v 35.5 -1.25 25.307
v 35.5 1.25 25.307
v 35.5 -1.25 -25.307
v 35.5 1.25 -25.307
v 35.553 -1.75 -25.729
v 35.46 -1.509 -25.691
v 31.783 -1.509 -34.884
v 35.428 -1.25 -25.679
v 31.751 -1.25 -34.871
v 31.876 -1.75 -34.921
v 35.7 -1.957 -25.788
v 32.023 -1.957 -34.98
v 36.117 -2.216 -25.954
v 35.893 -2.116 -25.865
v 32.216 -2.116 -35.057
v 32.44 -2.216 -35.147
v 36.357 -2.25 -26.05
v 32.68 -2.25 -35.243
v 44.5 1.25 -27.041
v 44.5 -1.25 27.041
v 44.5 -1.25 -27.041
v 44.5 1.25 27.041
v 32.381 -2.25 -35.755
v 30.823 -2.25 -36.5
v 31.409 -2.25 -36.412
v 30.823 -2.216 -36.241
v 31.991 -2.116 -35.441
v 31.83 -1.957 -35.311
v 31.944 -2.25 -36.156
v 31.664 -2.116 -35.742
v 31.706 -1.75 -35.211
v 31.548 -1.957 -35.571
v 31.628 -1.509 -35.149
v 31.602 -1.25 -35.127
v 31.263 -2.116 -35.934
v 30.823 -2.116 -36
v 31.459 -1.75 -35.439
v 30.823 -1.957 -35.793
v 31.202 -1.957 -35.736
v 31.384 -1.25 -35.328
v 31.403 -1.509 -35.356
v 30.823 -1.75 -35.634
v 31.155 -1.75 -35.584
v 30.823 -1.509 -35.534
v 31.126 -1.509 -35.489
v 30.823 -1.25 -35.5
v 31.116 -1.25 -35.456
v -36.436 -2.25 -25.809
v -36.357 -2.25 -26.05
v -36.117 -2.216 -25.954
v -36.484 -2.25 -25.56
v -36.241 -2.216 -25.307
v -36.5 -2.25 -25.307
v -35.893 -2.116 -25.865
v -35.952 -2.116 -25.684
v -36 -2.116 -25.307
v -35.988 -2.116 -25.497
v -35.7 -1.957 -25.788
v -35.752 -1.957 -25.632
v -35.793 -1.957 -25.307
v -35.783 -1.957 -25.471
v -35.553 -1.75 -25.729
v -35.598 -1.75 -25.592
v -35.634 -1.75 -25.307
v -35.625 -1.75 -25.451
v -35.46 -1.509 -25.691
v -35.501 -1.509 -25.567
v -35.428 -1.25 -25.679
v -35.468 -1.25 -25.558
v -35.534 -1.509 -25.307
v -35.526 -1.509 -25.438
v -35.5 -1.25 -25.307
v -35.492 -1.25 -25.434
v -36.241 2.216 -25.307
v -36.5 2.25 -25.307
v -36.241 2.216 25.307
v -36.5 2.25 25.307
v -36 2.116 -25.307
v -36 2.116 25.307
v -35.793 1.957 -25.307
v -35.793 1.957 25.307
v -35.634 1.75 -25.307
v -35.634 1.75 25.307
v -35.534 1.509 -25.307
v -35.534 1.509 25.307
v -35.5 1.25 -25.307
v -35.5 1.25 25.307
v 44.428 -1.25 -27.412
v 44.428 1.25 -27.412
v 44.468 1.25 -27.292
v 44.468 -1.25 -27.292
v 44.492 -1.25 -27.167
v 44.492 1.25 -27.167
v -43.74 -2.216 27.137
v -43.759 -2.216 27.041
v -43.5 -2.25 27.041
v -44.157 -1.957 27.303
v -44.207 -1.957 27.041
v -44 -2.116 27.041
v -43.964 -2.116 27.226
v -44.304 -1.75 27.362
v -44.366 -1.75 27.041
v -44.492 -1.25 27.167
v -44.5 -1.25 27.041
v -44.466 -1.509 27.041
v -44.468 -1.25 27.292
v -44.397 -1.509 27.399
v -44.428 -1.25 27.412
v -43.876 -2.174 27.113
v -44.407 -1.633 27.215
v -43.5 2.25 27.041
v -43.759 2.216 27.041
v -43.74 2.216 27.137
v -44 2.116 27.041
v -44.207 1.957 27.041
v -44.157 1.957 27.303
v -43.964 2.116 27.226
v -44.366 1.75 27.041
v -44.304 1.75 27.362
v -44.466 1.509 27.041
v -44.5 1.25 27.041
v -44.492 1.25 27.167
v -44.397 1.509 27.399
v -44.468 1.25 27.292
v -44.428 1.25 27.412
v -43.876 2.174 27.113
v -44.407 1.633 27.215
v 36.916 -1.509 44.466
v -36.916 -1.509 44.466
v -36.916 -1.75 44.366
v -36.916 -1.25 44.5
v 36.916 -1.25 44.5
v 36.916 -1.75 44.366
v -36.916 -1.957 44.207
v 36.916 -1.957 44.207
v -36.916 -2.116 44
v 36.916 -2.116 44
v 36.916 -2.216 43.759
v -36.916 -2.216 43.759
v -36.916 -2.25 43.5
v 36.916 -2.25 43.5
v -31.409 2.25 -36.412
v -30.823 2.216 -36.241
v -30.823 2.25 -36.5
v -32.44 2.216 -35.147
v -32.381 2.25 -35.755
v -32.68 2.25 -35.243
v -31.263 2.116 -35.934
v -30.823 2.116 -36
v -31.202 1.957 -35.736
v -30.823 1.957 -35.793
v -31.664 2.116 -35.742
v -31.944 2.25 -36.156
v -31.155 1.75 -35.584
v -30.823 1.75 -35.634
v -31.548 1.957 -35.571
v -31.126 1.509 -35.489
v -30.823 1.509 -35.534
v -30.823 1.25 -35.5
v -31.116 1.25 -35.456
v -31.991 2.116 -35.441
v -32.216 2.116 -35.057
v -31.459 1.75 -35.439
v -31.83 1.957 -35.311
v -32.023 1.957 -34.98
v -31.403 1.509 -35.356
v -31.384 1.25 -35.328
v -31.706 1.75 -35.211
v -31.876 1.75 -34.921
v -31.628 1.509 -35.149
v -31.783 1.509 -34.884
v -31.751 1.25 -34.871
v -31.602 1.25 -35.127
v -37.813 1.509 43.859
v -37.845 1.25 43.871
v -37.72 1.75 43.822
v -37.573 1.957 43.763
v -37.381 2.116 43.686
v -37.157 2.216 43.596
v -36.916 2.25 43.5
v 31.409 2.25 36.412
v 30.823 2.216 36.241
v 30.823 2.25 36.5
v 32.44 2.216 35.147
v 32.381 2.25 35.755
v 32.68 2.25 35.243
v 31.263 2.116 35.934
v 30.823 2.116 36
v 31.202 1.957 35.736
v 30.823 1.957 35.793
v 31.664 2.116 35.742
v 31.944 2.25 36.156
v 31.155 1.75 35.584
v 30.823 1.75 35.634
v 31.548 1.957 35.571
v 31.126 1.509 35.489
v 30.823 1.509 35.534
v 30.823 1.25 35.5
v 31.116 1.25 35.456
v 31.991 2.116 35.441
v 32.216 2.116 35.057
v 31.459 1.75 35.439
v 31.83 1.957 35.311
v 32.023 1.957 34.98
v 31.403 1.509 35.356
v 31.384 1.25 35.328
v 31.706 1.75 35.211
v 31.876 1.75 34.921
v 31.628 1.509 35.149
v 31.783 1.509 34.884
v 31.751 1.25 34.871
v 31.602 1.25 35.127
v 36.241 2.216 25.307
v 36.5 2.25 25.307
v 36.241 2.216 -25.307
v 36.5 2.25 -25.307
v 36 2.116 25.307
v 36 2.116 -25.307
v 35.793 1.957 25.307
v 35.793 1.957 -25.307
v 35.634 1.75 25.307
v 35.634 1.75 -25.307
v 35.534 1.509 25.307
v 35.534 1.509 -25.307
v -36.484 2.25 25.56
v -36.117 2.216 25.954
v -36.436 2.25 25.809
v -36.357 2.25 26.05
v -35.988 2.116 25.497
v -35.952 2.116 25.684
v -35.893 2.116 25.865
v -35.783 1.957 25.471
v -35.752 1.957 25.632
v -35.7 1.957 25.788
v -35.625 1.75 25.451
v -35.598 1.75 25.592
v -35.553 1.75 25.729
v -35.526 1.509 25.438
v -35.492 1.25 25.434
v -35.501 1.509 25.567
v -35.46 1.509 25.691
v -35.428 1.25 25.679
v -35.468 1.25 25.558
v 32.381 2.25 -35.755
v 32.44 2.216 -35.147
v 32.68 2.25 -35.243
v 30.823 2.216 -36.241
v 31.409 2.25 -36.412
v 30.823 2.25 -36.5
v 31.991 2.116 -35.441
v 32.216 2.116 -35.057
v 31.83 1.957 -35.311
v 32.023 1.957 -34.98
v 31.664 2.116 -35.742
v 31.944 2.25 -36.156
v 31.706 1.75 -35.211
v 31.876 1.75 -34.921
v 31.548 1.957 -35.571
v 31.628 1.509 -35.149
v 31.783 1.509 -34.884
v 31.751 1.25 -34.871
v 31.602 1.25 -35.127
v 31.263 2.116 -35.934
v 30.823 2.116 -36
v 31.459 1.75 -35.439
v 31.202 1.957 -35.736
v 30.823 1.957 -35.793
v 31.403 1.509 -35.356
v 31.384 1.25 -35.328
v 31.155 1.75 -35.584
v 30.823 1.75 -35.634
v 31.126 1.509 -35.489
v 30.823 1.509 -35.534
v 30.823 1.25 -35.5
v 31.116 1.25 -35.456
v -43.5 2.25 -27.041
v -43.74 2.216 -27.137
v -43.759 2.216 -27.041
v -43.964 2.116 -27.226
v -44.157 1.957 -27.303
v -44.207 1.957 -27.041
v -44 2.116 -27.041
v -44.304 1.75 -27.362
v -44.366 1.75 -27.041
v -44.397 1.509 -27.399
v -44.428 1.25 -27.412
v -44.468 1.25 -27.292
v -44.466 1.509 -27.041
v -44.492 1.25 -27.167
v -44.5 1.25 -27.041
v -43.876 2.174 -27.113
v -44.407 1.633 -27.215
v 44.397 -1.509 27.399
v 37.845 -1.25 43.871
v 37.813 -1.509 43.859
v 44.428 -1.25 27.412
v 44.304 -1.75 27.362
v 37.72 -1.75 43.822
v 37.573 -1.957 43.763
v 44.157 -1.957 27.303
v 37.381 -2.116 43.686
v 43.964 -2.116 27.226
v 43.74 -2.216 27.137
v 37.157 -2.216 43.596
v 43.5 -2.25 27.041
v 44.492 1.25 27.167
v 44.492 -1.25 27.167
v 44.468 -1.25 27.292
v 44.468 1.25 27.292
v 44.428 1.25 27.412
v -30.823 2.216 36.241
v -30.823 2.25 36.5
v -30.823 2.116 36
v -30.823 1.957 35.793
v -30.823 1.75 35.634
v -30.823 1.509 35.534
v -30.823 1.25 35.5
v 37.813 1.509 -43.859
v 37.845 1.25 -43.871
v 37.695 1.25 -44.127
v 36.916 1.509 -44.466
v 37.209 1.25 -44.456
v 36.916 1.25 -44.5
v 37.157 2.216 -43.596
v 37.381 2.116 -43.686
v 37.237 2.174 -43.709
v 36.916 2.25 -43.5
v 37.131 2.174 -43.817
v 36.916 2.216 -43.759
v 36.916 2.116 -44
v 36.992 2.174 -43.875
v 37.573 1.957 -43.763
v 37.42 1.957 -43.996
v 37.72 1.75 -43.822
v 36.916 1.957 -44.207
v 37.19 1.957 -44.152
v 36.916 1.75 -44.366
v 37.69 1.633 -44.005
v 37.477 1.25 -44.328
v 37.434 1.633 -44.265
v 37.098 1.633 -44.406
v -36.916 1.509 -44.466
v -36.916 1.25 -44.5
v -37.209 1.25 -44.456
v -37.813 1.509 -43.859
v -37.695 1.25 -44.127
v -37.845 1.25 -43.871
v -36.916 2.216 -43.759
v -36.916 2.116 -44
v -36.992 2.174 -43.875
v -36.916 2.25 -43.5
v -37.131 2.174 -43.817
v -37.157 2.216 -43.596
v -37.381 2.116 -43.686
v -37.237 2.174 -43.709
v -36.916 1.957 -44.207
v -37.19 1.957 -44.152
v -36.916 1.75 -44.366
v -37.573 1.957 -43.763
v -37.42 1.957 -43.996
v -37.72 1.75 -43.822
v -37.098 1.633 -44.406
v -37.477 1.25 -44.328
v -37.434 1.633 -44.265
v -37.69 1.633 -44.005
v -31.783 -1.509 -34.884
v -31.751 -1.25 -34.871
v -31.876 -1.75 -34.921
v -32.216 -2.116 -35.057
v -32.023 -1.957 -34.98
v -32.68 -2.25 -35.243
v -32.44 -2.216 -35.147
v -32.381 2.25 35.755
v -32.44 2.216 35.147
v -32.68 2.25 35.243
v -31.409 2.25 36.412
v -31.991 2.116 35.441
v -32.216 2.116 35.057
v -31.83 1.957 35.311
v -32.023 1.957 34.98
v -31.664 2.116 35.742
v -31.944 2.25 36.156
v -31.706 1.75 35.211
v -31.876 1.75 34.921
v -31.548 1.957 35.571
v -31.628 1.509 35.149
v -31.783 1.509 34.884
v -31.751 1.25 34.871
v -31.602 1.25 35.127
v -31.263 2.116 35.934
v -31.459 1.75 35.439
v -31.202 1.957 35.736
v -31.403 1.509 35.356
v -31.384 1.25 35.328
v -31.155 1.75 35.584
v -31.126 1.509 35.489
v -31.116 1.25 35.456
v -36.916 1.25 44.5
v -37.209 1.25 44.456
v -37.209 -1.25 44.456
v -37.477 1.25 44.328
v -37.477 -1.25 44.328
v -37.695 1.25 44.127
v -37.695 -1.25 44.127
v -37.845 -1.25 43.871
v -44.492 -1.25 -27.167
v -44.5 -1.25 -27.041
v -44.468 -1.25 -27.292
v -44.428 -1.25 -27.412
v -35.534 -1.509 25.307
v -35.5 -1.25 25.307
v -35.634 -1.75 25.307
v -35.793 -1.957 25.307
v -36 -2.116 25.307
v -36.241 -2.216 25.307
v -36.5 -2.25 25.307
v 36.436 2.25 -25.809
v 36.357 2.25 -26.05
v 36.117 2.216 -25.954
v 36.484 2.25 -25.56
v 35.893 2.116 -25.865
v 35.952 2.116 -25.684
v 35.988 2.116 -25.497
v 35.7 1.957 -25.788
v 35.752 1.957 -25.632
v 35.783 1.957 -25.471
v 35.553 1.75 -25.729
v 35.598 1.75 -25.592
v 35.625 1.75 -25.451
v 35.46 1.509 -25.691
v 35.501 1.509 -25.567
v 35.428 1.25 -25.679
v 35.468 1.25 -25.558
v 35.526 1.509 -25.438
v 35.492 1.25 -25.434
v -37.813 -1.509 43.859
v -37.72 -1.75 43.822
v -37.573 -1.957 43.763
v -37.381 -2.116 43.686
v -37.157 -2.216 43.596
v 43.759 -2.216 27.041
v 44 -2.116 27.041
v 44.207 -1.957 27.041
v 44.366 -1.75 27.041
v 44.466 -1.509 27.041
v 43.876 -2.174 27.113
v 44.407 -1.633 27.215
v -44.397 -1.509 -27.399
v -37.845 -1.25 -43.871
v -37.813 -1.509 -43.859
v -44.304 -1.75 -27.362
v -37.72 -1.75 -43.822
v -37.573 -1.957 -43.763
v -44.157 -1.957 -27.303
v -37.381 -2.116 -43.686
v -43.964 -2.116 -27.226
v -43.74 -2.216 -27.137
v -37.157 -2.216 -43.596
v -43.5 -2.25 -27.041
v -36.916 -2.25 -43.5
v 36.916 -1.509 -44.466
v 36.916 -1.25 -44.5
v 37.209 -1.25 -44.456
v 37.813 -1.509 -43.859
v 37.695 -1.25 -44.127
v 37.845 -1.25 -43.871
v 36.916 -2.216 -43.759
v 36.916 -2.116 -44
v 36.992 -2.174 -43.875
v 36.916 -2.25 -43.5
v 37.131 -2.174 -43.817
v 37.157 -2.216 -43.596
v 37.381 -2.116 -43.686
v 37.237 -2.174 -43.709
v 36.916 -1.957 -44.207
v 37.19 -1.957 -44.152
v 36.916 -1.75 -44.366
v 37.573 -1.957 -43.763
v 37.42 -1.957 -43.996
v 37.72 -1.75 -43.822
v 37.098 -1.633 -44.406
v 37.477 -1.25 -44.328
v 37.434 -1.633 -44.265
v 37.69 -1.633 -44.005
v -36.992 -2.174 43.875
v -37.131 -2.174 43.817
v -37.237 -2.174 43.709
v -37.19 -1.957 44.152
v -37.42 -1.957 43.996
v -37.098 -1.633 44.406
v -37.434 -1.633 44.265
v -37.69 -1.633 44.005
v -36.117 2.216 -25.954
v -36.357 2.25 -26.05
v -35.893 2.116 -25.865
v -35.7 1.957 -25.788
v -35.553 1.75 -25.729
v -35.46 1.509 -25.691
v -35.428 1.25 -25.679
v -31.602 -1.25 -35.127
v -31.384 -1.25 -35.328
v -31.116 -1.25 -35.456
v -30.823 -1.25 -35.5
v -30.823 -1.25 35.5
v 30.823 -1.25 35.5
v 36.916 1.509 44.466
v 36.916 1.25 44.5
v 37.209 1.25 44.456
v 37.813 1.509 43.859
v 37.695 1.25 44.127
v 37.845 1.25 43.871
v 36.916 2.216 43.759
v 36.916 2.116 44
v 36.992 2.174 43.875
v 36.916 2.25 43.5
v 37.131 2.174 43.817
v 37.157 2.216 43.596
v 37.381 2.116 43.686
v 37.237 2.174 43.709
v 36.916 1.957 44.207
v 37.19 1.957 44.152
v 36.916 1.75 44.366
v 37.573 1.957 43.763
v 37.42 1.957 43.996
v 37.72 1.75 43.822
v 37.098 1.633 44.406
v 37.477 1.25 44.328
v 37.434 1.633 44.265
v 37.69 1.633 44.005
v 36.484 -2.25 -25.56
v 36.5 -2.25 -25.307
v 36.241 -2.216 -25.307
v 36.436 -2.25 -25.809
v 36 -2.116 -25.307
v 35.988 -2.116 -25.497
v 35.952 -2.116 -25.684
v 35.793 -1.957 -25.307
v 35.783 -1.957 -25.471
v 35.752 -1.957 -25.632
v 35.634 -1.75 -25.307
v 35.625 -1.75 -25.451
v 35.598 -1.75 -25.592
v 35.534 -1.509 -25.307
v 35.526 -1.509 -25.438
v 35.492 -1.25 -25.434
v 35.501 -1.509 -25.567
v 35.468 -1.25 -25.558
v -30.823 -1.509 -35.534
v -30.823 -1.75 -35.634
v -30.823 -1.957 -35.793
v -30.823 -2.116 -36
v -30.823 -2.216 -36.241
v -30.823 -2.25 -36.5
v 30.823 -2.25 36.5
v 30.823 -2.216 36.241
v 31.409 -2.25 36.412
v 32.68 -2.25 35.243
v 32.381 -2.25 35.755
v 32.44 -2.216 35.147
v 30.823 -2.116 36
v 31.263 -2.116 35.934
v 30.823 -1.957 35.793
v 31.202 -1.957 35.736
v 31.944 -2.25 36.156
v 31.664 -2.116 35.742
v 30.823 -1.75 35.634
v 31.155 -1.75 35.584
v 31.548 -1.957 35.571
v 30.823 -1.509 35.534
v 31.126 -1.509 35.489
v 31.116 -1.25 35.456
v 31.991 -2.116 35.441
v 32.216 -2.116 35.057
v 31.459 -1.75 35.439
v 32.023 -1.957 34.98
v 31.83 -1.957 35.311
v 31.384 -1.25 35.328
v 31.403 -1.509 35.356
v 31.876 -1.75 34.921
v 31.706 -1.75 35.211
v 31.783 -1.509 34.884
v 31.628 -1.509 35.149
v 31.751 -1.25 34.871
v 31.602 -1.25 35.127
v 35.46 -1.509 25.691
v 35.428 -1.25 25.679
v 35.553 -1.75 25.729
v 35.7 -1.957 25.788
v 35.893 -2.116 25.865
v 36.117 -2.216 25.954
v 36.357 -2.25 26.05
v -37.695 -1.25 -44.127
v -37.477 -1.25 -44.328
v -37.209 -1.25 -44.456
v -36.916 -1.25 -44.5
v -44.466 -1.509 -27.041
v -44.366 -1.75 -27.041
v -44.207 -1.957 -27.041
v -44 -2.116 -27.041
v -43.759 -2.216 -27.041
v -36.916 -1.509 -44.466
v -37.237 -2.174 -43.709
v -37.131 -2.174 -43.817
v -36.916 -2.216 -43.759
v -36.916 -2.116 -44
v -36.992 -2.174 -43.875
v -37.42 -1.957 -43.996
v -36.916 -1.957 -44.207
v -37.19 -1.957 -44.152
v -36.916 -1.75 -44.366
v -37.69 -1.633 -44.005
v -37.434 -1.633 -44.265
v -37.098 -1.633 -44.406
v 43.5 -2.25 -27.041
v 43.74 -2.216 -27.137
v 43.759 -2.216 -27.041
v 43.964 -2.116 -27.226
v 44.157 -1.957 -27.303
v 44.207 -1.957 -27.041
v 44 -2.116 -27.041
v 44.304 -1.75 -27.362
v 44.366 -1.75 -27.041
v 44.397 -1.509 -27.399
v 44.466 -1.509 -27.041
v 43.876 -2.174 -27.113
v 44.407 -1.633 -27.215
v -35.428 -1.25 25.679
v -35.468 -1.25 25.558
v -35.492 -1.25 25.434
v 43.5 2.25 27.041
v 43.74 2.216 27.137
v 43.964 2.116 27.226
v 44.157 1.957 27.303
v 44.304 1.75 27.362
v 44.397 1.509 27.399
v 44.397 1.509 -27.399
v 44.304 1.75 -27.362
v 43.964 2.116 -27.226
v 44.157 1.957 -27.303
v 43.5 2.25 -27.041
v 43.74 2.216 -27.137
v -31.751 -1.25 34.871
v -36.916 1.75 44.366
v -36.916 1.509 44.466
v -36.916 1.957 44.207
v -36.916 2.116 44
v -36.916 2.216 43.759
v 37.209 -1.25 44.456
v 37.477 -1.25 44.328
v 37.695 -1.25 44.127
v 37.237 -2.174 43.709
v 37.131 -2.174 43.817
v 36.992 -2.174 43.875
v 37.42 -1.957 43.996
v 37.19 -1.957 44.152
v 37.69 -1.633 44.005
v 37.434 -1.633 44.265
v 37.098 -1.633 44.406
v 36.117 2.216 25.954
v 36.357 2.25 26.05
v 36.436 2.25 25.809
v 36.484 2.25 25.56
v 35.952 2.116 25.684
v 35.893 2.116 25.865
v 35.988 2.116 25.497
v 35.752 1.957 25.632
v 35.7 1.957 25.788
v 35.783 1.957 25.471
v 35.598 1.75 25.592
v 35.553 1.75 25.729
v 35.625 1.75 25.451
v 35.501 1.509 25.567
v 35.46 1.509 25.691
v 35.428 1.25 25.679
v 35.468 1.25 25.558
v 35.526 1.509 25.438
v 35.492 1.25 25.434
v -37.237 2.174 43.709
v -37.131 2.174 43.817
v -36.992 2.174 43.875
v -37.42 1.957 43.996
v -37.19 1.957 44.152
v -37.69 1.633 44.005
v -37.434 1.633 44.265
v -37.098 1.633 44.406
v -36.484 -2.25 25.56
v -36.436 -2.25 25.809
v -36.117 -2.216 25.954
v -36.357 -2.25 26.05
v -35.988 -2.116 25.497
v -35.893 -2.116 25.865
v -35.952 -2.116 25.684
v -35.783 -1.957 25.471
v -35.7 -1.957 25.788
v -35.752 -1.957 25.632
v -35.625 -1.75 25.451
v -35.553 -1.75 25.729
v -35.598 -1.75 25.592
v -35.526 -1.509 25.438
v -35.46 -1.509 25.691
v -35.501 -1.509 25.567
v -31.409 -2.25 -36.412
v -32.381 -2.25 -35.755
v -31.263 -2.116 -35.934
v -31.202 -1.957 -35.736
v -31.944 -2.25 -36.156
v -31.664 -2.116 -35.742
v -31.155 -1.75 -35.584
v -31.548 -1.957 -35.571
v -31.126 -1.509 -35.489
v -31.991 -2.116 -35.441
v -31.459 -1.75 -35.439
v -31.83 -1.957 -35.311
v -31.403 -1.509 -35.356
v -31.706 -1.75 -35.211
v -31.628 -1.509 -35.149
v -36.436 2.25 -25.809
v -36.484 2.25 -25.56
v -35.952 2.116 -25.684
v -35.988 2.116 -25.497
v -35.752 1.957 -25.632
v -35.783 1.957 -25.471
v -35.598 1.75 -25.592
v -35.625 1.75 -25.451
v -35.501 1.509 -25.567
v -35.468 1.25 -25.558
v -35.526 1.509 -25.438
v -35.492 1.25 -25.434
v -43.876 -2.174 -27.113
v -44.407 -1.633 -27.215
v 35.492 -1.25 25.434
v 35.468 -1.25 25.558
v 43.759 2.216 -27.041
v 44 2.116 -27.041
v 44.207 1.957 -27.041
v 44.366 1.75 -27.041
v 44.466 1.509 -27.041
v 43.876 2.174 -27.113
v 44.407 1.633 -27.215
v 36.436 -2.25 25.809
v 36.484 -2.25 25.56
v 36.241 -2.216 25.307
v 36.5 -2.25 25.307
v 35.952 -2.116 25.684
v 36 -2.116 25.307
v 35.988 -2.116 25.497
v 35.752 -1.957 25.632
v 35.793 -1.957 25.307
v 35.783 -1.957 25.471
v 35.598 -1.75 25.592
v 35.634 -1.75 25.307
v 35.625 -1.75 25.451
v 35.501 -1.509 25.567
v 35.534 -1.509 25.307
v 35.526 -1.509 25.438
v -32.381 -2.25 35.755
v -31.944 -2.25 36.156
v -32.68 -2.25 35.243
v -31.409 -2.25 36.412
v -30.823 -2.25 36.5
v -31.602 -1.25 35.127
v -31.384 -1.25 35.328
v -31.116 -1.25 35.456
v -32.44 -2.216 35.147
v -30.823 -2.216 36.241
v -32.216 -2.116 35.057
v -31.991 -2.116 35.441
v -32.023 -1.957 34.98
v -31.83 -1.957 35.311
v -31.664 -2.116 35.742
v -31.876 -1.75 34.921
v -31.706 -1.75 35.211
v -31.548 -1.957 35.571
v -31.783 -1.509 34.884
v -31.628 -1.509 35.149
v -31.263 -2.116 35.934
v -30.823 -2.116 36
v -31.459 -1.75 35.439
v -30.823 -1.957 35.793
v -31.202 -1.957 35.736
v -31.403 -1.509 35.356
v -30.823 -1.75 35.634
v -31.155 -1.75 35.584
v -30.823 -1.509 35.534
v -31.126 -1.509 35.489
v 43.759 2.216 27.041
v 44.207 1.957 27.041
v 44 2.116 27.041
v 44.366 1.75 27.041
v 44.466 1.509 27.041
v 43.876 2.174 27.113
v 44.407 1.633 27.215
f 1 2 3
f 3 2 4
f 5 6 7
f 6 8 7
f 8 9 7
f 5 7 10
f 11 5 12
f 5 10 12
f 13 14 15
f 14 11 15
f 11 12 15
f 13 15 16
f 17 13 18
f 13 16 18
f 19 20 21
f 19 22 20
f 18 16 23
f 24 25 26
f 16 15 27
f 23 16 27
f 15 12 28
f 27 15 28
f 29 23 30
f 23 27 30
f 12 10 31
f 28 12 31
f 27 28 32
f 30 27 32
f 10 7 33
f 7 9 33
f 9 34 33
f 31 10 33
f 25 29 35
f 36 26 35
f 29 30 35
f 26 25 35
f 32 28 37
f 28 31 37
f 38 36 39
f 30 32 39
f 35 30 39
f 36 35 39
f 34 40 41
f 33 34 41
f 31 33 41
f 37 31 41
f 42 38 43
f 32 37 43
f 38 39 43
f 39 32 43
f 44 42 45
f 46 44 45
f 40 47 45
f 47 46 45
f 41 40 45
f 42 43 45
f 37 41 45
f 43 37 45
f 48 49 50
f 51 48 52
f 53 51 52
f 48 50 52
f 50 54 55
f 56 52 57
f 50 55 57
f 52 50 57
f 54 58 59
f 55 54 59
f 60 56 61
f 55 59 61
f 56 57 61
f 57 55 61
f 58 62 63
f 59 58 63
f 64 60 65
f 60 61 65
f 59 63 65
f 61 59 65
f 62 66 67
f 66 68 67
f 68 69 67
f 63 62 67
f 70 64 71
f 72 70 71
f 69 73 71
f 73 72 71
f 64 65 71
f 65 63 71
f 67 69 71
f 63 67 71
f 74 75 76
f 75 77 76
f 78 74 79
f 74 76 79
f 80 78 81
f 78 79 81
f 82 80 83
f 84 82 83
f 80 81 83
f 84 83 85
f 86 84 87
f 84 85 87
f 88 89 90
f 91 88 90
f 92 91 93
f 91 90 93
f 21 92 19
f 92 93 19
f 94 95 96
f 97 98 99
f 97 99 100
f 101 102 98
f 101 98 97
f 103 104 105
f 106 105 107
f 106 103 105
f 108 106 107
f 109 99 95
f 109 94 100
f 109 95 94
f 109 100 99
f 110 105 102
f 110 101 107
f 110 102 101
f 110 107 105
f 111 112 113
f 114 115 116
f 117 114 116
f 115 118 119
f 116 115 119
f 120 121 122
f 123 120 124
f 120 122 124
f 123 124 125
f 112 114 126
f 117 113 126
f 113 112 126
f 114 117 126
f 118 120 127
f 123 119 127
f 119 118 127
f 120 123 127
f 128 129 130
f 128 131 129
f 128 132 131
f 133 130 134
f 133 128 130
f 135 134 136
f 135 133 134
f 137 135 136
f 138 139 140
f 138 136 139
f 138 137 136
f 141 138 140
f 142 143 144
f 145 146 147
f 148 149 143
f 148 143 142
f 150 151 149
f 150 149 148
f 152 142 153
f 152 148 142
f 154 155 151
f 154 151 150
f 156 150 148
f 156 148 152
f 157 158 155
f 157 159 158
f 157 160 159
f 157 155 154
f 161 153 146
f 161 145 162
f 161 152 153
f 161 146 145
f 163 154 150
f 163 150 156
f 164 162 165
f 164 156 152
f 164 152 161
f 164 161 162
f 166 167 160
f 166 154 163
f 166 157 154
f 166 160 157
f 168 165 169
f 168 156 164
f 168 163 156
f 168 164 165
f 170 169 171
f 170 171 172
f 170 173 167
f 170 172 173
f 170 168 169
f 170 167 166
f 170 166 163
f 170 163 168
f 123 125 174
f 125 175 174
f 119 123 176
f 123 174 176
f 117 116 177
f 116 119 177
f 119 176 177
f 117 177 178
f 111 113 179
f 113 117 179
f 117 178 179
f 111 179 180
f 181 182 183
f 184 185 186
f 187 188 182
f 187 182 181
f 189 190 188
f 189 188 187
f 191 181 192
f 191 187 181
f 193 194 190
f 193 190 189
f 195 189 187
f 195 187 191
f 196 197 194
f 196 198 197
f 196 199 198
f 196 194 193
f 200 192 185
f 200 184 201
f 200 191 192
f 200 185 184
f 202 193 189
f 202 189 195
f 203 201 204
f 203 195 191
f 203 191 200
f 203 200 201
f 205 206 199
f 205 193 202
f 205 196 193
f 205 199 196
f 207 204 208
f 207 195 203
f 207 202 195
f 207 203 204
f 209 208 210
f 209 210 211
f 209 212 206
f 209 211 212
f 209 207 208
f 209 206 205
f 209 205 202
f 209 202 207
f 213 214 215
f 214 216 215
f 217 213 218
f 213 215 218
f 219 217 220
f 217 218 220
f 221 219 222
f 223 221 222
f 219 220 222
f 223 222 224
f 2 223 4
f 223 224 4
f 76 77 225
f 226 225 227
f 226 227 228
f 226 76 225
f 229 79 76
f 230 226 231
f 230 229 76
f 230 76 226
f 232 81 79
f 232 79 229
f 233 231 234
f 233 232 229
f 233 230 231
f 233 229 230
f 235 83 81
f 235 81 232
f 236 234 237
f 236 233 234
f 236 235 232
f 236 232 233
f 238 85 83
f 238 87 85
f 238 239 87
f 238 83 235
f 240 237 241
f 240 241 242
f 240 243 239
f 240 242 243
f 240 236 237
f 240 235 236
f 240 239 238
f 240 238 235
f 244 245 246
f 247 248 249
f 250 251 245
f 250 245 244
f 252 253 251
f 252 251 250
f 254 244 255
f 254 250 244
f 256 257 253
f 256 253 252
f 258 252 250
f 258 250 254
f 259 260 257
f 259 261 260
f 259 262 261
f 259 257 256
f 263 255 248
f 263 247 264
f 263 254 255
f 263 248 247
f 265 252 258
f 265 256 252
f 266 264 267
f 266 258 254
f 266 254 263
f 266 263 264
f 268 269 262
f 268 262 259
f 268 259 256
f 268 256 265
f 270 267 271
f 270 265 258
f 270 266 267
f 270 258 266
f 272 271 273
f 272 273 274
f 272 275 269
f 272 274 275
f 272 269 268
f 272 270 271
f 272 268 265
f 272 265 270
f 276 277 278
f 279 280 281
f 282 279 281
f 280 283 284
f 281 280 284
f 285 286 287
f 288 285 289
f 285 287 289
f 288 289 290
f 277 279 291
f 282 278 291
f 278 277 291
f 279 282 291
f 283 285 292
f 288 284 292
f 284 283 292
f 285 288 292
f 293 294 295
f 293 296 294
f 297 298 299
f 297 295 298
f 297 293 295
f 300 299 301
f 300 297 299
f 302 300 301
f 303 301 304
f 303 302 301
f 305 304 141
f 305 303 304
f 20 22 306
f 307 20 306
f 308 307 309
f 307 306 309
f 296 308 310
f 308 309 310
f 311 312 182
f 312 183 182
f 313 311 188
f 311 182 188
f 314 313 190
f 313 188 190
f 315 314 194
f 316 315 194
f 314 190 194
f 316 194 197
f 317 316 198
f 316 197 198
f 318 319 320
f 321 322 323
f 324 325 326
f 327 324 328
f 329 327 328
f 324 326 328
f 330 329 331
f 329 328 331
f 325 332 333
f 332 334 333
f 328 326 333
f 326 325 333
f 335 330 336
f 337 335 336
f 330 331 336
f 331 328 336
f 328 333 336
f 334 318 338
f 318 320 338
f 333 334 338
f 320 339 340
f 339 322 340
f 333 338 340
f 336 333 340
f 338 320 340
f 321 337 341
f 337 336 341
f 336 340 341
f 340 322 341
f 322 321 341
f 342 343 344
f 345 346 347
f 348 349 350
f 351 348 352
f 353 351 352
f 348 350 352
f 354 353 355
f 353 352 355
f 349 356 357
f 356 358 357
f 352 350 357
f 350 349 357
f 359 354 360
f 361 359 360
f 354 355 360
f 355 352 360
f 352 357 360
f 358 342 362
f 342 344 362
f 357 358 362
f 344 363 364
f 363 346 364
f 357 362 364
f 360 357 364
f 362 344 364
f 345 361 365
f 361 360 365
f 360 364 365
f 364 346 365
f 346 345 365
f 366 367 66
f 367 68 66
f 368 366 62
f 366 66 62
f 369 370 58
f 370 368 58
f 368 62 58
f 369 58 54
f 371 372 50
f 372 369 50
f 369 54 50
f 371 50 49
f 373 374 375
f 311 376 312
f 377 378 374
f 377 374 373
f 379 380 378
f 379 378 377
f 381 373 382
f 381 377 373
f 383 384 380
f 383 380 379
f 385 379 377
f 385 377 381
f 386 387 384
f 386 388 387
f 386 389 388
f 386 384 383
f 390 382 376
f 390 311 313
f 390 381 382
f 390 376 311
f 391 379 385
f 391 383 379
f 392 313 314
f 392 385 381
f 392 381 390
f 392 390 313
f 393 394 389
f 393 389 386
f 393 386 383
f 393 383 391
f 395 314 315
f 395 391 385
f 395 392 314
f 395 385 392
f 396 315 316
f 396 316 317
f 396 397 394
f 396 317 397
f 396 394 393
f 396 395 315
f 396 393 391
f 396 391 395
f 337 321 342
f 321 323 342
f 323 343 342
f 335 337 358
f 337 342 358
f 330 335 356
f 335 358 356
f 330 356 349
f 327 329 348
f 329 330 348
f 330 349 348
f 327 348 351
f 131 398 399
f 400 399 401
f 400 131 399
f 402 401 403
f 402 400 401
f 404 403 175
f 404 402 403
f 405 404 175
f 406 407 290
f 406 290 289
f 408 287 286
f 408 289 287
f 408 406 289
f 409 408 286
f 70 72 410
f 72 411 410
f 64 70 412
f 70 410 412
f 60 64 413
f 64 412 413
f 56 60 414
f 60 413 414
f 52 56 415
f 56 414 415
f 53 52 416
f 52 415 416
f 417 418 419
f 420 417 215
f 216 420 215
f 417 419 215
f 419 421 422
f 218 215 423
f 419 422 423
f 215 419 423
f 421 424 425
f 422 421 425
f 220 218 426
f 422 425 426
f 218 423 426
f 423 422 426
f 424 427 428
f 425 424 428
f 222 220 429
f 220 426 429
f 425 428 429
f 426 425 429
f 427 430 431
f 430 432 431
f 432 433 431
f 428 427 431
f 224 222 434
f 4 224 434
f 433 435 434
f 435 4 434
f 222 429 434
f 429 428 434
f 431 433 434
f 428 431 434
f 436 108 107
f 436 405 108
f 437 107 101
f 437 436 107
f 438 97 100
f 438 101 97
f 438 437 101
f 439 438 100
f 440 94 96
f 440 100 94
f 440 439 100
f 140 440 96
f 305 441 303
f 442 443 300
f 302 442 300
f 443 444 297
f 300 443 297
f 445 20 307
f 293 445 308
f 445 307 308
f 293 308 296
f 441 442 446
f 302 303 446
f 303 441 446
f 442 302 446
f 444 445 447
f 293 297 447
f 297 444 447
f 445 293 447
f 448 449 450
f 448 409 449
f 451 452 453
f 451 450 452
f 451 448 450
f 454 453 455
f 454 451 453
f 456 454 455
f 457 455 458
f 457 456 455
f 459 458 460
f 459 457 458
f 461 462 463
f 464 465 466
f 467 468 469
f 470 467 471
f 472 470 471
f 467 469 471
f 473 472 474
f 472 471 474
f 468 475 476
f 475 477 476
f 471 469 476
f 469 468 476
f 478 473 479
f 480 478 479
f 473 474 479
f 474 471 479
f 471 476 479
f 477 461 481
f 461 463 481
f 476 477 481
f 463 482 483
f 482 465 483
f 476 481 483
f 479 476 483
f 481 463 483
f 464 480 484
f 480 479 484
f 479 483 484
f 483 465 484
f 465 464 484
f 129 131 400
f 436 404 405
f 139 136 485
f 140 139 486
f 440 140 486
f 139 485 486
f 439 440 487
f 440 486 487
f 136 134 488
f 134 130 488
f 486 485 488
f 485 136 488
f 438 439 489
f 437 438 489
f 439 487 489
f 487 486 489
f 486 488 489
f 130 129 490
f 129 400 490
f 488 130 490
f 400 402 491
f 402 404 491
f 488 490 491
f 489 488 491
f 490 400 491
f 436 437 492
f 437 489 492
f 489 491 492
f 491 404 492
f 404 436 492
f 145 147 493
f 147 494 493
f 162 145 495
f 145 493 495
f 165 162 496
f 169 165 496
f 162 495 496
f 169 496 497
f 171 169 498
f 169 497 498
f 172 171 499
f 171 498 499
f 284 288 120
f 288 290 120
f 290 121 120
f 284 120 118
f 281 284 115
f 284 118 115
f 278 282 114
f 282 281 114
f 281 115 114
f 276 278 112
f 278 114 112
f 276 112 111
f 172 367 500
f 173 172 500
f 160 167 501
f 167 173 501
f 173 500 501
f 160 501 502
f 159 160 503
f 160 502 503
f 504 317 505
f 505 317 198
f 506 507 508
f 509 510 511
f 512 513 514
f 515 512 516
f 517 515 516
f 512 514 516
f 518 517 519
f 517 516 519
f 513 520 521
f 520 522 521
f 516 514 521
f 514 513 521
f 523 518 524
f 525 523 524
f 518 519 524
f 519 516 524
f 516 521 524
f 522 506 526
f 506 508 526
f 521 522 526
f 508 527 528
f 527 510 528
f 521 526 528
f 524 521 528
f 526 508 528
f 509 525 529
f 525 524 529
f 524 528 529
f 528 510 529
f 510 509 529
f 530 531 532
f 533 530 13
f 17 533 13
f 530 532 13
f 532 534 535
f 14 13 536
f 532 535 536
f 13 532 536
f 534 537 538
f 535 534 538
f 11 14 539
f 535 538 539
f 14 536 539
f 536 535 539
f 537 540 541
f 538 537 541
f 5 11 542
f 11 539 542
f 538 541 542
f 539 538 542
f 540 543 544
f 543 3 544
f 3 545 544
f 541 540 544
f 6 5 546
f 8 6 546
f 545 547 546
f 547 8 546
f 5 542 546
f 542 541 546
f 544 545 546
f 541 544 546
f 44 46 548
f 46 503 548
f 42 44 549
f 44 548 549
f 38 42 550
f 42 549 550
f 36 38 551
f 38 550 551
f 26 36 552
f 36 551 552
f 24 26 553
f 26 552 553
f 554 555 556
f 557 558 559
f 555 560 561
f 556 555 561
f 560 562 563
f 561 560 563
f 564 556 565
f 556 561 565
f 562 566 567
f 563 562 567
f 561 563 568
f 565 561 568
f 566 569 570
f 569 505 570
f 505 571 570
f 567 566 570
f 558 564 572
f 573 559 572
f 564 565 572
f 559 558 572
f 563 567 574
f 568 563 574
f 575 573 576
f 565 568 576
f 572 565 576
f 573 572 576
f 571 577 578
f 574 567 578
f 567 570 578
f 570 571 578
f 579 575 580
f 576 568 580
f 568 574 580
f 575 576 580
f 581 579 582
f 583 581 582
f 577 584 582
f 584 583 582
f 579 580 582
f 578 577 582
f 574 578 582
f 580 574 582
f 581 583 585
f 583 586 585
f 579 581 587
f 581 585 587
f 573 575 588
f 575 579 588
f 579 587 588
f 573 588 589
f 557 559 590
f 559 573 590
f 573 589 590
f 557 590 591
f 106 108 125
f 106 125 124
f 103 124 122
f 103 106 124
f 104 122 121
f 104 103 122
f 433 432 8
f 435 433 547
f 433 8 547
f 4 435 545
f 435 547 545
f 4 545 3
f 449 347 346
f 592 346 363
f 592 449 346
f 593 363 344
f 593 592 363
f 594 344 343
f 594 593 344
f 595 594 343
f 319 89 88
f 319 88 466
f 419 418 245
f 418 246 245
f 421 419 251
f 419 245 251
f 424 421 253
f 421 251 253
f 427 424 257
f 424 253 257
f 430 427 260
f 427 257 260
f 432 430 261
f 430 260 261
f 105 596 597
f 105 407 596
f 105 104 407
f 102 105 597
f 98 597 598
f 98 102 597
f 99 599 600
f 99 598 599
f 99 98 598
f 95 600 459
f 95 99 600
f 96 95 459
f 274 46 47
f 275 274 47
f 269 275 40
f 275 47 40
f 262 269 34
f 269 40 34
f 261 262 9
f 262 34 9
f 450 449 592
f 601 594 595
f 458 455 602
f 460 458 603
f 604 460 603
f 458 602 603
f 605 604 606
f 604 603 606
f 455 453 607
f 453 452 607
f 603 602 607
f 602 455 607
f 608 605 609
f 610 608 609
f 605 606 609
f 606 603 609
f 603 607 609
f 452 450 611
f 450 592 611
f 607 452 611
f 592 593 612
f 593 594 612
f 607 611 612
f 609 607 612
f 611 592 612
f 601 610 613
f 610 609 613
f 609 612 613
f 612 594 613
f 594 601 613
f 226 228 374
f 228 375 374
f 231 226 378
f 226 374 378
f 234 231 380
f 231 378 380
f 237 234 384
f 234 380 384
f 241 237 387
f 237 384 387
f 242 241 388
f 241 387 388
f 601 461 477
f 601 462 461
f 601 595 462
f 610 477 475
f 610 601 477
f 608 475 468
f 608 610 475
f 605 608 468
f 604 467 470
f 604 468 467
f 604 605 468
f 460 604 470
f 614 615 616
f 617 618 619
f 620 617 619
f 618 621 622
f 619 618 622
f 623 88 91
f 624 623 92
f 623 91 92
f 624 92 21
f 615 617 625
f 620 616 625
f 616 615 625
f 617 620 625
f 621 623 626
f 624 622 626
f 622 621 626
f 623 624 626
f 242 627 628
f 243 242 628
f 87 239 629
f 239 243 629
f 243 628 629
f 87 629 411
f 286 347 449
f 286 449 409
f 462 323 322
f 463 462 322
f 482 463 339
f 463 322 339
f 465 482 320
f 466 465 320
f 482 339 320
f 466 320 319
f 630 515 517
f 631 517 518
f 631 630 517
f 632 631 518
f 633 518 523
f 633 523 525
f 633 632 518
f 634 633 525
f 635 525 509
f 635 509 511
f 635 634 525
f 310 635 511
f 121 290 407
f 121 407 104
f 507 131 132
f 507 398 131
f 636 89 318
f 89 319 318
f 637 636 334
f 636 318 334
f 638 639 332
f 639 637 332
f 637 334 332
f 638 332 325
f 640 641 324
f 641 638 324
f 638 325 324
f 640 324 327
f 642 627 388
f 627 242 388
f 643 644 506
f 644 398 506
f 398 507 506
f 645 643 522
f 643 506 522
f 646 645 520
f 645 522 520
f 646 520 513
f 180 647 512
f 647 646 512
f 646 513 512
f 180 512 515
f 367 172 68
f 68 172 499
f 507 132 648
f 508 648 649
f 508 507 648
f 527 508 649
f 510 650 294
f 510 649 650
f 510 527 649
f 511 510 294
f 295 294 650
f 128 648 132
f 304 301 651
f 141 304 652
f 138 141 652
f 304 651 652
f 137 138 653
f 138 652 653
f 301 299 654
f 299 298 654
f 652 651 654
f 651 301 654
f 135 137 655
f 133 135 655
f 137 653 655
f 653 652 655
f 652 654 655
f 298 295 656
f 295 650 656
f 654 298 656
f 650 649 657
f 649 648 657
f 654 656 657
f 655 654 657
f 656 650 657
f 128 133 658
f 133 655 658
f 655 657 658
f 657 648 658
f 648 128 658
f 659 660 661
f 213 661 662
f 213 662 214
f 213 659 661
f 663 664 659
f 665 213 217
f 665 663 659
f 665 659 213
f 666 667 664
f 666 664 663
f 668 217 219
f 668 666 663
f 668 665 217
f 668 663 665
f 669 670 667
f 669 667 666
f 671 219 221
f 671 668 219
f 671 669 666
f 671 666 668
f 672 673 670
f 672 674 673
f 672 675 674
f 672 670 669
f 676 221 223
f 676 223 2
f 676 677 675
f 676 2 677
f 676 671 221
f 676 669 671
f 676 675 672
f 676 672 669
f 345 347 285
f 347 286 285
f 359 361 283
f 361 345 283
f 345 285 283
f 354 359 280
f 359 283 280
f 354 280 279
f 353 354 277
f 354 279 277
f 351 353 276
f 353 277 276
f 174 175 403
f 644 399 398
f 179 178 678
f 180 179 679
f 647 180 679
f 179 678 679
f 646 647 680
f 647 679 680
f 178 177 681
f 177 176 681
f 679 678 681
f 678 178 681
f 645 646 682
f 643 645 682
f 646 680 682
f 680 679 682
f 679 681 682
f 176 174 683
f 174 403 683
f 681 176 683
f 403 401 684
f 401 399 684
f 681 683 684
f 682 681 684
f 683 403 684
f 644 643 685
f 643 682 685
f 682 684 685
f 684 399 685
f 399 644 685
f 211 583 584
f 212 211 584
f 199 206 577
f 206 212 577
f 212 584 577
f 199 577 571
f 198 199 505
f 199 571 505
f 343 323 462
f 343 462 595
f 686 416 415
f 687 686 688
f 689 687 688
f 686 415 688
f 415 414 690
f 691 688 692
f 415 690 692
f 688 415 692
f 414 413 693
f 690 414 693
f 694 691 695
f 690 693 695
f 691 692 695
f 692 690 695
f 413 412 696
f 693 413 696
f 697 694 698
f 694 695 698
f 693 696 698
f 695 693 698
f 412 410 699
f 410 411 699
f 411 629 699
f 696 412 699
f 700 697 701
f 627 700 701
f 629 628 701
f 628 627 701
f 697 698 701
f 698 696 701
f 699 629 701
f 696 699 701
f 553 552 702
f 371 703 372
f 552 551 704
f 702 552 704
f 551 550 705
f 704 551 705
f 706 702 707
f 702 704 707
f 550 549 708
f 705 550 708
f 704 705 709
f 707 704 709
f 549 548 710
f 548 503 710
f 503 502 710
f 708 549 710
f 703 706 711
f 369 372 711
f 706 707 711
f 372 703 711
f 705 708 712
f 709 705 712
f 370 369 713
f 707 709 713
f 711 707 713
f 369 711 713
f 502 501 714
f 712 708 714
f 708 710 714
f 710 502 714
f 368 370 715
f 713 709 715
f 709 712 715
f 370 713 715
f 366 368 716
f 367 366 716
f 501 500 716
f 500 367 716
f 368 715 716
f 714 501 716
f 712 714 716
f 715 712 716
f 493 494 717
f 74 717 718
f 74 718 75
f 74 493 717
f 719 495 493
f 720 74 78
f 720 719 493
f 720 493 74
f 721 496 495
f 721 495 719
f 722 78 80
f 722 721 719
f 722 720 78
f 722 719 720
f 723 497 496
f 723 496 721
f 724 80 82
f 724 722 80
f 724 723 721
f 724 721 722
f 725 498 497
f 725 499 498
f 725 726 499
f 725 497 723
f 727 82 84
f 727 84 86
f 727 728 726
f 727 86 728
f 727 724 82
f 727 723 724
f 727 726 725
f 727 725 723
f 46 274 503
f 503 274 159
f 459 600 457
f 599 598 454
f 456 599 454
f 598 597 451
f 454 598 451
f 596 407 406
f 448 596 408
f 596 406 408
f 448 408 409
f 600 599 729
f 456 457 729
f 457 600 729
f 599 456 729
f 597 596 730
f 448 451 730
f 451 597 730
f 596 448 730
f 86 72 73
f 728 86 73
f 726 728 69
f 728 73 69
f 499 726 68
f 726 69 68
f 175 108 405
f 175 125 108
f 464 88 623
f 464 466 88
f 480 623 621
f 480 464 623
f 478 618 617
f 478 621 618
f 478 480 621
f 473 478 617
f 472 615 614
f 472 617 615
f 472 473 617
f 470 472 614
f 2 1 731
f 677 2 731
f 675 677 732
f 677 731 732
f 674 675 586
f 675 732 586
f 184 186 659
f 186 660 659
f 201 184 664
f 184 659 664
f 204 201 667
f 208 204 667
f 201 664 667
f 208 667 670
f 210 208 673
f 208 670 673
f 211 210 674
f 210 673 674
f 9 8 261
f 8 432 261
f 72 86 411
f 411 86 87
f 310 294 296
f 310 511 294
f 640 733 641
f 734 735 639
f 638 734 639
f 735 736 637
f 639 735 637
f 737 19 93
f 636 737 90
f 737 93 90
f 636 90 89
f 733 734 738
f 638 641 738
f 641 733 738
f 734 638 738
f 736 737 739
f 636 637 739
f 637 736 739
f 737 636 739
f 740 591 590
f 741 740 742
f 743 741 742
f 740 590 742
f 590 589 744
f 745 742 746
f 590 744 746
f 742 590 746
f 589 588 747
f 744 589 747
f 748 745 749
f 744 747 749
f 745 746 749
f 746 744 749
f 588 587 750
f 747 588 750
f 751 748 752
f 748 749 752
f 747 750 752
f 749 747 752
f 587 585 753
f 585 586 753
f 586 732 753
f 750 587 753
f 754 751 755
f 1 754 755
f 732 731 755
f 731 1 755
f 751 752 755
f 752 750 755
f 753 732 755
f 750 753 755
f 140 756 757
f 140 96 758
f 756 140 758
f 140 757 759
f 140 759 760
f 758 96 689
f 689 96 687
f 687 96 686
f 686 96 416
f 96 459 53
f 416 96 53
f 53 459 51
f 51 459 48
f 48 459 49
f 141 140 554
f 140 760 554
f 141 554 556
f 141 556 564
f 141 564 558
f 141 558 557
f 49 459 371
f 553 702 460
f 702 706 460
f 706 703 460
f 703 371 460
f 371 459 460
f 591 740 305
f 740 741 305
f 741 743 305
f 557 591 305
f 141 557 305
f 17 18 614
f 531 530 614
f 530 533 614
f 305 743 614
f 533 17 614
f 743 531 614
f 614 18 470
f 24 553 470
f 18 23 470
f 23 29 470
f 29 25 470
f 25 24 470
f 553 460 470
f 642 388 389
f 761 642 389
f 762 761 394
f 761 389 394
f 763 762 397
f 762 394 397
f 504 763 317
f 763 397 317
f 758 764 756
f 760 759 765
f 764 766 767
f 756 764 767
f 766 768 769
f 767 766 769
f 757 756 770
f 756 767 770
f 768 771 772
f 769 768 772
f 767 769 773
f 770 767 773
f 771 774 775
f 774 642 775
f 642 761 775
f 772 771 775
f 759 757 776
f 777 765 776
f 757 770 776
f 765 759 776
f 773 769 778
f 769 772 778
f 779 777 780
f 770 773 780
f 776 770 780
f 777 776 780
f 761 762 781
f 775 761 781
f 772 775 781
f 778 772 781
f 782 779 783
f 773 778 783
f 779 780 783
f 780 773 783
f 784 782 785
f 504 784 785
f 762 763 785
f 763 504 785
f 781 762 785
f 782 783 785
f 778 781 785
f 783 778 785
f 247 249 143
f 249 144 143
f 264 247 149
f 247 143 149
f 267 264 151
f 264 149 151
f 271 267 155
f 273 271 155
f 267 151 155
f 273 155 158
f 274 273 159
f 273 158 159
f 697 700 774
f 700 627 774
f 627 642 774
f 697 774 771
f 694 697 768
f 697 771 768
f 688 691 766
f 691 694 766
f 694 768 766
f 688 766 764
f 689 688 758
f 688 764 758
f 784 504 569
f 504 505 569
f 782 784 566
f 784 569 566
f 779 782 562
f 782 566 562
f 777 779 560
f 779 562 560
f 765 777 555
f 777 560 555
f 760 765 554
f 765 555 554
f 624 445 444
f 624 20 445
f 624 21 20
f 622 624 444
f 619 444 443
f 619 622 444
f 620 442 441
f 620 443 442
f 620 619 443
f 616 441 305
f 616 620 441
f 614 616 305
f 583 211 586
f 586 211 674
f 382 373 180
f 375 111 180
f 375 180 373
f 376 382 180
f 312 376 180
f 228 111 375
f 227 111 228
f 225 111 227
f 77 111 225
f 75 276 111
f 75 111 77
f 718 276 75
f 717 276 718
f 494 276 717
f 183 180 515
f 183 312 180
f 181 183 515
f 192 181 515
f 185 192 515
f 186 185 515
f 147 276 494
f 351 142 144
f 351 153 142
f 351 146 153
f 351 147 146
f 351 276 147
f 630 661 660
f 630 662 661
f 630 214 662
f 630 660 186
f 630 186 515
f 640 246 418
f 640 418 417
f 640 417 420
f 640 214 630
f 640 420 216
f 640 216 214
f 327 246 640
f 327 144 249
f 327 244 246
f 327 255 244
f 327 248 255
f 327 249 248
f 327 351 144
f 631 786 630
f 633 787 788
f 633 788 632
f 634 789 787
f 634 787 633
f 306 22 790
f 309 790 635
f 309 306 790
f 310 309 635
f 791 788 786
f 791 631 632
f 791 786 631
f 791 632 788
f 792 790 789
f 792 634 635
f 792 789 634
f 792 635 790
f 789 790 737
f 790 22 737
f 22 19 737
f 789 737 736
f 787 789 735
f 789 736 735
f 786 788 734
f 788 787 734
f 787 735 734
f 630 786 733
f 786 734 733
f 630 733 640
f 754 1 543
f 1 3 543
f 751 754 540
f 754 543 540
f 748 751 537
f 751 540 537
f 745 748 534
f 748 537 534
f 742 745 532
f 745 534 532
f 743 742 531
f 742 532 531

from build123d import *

# Parameters (mm, degrees)
BOSS_EXTRUDE1_DEPTH = 2.25
FILLET1_R           = 1


with BuildPart() as part:
    # Sketch1 → Boss-Extrude1 (new body, symmetric)
    with BuildSketch(Plane(origin=(0, 0, 0), x_dir=(1, 0, 0), z_dir=(0, 1, 0))):
        Polygon((-37.593296653, -44.5), (37.593296653, -44.5), (44.5, -27.233241632), (44.5, 27.233241632), (37.593296653, 44.5), (-37.593296653, 44.5), (-44.5, 27.233241632), (-44.5, -27.233241632), align=None)
        Polygon((-31.5, -35.5), (31.5, -35.5), (35.5, -25.5), (35.5, 25.5), (31.5, 35.5), (-31.5, 35.5), (-35.5, 25.5), (-35.5, -25.5), align=None, mode=Mode.SUBTRACT)
    extrude(amount=BOSS_EXTRUDE1_DEPTH, both=True)

    # Fillet1
    fillet1_edges = [part.edges().sort_by_distance(p)[0] for p in [
        (44.5, -2.25, 0),
        (41.046648326, -2.25, 35.866620816),
        (0, -2.25, 44.5),
        (-41.046648326, -2.25, 35.866620816),
        (41.046648326, 2.25, 35.866620816),
        (-44.5, 0, 27.233241632),
        (-44.5, 0, -27.233241632),
        (-37.593296653, 0, -44.5),
        (37.593296653, 0, -44.5),
        (44.5, 0, -27.233241632),
        (44.5, 0, 27.233241632),
        (37.593296653, 0, 44.5),
        (-37.593296653, 0, 44.5),
        (44.5, 2.25, 0),
        (41.046648326, 2.25, -35.866620816),
        (0, 2.25, -44.5),
        (33.5, -2.25, -30.5),
        (35.5, 0, -25.5),
        (0, -2.25, -35.5),
        (31.5, 0, -35.5),
        (-33.5, -2.25, -30.5),
        (-31.5, 0, -35.5),
        (-35.5, -2.25, 0),
        (-41.046648326, 2.25, -35.866620816),
        (-35.5, 0, -25.5),
        (-33.5, -2.25, 30.5),
        (-35.5, 0, 25.5),
        (0, -2.25, 35.5),
        (-31.5, 0, 35.5),
        (33.5, -2.25, 30.5),
        (31.5, 0, 35.5),
        (35.5, -2.25, 0),
        (35.5, 0, 25.5),
        (33.5, 2.25, -30.5),
        (0, 2.25, -35.5),
        (-33.5, 2.25, -30.5),
        (-35.5, 2.25, 0),
        (-33.5, 2.25, 30.5),
        (0, 2.25, 35.5),
        (33.5, 2.25, 30.5),
        (-44.5, 2.25, 0),
        (35.5, 2.25, 0),
        (-41.046648326, 2.25, 35.866620816),
        (-44.5, -2.25, 0),
        (0, 2.25, 44.5),
        (-41.046648326, -2.25, -35.866620816),
        (0, -2.25, -44.5),
        (41.046648326, -2.25, -35.866620816),
    ]]
    fillet(fillet1_edges, radius=FILLET1_R)


solid = part.part
